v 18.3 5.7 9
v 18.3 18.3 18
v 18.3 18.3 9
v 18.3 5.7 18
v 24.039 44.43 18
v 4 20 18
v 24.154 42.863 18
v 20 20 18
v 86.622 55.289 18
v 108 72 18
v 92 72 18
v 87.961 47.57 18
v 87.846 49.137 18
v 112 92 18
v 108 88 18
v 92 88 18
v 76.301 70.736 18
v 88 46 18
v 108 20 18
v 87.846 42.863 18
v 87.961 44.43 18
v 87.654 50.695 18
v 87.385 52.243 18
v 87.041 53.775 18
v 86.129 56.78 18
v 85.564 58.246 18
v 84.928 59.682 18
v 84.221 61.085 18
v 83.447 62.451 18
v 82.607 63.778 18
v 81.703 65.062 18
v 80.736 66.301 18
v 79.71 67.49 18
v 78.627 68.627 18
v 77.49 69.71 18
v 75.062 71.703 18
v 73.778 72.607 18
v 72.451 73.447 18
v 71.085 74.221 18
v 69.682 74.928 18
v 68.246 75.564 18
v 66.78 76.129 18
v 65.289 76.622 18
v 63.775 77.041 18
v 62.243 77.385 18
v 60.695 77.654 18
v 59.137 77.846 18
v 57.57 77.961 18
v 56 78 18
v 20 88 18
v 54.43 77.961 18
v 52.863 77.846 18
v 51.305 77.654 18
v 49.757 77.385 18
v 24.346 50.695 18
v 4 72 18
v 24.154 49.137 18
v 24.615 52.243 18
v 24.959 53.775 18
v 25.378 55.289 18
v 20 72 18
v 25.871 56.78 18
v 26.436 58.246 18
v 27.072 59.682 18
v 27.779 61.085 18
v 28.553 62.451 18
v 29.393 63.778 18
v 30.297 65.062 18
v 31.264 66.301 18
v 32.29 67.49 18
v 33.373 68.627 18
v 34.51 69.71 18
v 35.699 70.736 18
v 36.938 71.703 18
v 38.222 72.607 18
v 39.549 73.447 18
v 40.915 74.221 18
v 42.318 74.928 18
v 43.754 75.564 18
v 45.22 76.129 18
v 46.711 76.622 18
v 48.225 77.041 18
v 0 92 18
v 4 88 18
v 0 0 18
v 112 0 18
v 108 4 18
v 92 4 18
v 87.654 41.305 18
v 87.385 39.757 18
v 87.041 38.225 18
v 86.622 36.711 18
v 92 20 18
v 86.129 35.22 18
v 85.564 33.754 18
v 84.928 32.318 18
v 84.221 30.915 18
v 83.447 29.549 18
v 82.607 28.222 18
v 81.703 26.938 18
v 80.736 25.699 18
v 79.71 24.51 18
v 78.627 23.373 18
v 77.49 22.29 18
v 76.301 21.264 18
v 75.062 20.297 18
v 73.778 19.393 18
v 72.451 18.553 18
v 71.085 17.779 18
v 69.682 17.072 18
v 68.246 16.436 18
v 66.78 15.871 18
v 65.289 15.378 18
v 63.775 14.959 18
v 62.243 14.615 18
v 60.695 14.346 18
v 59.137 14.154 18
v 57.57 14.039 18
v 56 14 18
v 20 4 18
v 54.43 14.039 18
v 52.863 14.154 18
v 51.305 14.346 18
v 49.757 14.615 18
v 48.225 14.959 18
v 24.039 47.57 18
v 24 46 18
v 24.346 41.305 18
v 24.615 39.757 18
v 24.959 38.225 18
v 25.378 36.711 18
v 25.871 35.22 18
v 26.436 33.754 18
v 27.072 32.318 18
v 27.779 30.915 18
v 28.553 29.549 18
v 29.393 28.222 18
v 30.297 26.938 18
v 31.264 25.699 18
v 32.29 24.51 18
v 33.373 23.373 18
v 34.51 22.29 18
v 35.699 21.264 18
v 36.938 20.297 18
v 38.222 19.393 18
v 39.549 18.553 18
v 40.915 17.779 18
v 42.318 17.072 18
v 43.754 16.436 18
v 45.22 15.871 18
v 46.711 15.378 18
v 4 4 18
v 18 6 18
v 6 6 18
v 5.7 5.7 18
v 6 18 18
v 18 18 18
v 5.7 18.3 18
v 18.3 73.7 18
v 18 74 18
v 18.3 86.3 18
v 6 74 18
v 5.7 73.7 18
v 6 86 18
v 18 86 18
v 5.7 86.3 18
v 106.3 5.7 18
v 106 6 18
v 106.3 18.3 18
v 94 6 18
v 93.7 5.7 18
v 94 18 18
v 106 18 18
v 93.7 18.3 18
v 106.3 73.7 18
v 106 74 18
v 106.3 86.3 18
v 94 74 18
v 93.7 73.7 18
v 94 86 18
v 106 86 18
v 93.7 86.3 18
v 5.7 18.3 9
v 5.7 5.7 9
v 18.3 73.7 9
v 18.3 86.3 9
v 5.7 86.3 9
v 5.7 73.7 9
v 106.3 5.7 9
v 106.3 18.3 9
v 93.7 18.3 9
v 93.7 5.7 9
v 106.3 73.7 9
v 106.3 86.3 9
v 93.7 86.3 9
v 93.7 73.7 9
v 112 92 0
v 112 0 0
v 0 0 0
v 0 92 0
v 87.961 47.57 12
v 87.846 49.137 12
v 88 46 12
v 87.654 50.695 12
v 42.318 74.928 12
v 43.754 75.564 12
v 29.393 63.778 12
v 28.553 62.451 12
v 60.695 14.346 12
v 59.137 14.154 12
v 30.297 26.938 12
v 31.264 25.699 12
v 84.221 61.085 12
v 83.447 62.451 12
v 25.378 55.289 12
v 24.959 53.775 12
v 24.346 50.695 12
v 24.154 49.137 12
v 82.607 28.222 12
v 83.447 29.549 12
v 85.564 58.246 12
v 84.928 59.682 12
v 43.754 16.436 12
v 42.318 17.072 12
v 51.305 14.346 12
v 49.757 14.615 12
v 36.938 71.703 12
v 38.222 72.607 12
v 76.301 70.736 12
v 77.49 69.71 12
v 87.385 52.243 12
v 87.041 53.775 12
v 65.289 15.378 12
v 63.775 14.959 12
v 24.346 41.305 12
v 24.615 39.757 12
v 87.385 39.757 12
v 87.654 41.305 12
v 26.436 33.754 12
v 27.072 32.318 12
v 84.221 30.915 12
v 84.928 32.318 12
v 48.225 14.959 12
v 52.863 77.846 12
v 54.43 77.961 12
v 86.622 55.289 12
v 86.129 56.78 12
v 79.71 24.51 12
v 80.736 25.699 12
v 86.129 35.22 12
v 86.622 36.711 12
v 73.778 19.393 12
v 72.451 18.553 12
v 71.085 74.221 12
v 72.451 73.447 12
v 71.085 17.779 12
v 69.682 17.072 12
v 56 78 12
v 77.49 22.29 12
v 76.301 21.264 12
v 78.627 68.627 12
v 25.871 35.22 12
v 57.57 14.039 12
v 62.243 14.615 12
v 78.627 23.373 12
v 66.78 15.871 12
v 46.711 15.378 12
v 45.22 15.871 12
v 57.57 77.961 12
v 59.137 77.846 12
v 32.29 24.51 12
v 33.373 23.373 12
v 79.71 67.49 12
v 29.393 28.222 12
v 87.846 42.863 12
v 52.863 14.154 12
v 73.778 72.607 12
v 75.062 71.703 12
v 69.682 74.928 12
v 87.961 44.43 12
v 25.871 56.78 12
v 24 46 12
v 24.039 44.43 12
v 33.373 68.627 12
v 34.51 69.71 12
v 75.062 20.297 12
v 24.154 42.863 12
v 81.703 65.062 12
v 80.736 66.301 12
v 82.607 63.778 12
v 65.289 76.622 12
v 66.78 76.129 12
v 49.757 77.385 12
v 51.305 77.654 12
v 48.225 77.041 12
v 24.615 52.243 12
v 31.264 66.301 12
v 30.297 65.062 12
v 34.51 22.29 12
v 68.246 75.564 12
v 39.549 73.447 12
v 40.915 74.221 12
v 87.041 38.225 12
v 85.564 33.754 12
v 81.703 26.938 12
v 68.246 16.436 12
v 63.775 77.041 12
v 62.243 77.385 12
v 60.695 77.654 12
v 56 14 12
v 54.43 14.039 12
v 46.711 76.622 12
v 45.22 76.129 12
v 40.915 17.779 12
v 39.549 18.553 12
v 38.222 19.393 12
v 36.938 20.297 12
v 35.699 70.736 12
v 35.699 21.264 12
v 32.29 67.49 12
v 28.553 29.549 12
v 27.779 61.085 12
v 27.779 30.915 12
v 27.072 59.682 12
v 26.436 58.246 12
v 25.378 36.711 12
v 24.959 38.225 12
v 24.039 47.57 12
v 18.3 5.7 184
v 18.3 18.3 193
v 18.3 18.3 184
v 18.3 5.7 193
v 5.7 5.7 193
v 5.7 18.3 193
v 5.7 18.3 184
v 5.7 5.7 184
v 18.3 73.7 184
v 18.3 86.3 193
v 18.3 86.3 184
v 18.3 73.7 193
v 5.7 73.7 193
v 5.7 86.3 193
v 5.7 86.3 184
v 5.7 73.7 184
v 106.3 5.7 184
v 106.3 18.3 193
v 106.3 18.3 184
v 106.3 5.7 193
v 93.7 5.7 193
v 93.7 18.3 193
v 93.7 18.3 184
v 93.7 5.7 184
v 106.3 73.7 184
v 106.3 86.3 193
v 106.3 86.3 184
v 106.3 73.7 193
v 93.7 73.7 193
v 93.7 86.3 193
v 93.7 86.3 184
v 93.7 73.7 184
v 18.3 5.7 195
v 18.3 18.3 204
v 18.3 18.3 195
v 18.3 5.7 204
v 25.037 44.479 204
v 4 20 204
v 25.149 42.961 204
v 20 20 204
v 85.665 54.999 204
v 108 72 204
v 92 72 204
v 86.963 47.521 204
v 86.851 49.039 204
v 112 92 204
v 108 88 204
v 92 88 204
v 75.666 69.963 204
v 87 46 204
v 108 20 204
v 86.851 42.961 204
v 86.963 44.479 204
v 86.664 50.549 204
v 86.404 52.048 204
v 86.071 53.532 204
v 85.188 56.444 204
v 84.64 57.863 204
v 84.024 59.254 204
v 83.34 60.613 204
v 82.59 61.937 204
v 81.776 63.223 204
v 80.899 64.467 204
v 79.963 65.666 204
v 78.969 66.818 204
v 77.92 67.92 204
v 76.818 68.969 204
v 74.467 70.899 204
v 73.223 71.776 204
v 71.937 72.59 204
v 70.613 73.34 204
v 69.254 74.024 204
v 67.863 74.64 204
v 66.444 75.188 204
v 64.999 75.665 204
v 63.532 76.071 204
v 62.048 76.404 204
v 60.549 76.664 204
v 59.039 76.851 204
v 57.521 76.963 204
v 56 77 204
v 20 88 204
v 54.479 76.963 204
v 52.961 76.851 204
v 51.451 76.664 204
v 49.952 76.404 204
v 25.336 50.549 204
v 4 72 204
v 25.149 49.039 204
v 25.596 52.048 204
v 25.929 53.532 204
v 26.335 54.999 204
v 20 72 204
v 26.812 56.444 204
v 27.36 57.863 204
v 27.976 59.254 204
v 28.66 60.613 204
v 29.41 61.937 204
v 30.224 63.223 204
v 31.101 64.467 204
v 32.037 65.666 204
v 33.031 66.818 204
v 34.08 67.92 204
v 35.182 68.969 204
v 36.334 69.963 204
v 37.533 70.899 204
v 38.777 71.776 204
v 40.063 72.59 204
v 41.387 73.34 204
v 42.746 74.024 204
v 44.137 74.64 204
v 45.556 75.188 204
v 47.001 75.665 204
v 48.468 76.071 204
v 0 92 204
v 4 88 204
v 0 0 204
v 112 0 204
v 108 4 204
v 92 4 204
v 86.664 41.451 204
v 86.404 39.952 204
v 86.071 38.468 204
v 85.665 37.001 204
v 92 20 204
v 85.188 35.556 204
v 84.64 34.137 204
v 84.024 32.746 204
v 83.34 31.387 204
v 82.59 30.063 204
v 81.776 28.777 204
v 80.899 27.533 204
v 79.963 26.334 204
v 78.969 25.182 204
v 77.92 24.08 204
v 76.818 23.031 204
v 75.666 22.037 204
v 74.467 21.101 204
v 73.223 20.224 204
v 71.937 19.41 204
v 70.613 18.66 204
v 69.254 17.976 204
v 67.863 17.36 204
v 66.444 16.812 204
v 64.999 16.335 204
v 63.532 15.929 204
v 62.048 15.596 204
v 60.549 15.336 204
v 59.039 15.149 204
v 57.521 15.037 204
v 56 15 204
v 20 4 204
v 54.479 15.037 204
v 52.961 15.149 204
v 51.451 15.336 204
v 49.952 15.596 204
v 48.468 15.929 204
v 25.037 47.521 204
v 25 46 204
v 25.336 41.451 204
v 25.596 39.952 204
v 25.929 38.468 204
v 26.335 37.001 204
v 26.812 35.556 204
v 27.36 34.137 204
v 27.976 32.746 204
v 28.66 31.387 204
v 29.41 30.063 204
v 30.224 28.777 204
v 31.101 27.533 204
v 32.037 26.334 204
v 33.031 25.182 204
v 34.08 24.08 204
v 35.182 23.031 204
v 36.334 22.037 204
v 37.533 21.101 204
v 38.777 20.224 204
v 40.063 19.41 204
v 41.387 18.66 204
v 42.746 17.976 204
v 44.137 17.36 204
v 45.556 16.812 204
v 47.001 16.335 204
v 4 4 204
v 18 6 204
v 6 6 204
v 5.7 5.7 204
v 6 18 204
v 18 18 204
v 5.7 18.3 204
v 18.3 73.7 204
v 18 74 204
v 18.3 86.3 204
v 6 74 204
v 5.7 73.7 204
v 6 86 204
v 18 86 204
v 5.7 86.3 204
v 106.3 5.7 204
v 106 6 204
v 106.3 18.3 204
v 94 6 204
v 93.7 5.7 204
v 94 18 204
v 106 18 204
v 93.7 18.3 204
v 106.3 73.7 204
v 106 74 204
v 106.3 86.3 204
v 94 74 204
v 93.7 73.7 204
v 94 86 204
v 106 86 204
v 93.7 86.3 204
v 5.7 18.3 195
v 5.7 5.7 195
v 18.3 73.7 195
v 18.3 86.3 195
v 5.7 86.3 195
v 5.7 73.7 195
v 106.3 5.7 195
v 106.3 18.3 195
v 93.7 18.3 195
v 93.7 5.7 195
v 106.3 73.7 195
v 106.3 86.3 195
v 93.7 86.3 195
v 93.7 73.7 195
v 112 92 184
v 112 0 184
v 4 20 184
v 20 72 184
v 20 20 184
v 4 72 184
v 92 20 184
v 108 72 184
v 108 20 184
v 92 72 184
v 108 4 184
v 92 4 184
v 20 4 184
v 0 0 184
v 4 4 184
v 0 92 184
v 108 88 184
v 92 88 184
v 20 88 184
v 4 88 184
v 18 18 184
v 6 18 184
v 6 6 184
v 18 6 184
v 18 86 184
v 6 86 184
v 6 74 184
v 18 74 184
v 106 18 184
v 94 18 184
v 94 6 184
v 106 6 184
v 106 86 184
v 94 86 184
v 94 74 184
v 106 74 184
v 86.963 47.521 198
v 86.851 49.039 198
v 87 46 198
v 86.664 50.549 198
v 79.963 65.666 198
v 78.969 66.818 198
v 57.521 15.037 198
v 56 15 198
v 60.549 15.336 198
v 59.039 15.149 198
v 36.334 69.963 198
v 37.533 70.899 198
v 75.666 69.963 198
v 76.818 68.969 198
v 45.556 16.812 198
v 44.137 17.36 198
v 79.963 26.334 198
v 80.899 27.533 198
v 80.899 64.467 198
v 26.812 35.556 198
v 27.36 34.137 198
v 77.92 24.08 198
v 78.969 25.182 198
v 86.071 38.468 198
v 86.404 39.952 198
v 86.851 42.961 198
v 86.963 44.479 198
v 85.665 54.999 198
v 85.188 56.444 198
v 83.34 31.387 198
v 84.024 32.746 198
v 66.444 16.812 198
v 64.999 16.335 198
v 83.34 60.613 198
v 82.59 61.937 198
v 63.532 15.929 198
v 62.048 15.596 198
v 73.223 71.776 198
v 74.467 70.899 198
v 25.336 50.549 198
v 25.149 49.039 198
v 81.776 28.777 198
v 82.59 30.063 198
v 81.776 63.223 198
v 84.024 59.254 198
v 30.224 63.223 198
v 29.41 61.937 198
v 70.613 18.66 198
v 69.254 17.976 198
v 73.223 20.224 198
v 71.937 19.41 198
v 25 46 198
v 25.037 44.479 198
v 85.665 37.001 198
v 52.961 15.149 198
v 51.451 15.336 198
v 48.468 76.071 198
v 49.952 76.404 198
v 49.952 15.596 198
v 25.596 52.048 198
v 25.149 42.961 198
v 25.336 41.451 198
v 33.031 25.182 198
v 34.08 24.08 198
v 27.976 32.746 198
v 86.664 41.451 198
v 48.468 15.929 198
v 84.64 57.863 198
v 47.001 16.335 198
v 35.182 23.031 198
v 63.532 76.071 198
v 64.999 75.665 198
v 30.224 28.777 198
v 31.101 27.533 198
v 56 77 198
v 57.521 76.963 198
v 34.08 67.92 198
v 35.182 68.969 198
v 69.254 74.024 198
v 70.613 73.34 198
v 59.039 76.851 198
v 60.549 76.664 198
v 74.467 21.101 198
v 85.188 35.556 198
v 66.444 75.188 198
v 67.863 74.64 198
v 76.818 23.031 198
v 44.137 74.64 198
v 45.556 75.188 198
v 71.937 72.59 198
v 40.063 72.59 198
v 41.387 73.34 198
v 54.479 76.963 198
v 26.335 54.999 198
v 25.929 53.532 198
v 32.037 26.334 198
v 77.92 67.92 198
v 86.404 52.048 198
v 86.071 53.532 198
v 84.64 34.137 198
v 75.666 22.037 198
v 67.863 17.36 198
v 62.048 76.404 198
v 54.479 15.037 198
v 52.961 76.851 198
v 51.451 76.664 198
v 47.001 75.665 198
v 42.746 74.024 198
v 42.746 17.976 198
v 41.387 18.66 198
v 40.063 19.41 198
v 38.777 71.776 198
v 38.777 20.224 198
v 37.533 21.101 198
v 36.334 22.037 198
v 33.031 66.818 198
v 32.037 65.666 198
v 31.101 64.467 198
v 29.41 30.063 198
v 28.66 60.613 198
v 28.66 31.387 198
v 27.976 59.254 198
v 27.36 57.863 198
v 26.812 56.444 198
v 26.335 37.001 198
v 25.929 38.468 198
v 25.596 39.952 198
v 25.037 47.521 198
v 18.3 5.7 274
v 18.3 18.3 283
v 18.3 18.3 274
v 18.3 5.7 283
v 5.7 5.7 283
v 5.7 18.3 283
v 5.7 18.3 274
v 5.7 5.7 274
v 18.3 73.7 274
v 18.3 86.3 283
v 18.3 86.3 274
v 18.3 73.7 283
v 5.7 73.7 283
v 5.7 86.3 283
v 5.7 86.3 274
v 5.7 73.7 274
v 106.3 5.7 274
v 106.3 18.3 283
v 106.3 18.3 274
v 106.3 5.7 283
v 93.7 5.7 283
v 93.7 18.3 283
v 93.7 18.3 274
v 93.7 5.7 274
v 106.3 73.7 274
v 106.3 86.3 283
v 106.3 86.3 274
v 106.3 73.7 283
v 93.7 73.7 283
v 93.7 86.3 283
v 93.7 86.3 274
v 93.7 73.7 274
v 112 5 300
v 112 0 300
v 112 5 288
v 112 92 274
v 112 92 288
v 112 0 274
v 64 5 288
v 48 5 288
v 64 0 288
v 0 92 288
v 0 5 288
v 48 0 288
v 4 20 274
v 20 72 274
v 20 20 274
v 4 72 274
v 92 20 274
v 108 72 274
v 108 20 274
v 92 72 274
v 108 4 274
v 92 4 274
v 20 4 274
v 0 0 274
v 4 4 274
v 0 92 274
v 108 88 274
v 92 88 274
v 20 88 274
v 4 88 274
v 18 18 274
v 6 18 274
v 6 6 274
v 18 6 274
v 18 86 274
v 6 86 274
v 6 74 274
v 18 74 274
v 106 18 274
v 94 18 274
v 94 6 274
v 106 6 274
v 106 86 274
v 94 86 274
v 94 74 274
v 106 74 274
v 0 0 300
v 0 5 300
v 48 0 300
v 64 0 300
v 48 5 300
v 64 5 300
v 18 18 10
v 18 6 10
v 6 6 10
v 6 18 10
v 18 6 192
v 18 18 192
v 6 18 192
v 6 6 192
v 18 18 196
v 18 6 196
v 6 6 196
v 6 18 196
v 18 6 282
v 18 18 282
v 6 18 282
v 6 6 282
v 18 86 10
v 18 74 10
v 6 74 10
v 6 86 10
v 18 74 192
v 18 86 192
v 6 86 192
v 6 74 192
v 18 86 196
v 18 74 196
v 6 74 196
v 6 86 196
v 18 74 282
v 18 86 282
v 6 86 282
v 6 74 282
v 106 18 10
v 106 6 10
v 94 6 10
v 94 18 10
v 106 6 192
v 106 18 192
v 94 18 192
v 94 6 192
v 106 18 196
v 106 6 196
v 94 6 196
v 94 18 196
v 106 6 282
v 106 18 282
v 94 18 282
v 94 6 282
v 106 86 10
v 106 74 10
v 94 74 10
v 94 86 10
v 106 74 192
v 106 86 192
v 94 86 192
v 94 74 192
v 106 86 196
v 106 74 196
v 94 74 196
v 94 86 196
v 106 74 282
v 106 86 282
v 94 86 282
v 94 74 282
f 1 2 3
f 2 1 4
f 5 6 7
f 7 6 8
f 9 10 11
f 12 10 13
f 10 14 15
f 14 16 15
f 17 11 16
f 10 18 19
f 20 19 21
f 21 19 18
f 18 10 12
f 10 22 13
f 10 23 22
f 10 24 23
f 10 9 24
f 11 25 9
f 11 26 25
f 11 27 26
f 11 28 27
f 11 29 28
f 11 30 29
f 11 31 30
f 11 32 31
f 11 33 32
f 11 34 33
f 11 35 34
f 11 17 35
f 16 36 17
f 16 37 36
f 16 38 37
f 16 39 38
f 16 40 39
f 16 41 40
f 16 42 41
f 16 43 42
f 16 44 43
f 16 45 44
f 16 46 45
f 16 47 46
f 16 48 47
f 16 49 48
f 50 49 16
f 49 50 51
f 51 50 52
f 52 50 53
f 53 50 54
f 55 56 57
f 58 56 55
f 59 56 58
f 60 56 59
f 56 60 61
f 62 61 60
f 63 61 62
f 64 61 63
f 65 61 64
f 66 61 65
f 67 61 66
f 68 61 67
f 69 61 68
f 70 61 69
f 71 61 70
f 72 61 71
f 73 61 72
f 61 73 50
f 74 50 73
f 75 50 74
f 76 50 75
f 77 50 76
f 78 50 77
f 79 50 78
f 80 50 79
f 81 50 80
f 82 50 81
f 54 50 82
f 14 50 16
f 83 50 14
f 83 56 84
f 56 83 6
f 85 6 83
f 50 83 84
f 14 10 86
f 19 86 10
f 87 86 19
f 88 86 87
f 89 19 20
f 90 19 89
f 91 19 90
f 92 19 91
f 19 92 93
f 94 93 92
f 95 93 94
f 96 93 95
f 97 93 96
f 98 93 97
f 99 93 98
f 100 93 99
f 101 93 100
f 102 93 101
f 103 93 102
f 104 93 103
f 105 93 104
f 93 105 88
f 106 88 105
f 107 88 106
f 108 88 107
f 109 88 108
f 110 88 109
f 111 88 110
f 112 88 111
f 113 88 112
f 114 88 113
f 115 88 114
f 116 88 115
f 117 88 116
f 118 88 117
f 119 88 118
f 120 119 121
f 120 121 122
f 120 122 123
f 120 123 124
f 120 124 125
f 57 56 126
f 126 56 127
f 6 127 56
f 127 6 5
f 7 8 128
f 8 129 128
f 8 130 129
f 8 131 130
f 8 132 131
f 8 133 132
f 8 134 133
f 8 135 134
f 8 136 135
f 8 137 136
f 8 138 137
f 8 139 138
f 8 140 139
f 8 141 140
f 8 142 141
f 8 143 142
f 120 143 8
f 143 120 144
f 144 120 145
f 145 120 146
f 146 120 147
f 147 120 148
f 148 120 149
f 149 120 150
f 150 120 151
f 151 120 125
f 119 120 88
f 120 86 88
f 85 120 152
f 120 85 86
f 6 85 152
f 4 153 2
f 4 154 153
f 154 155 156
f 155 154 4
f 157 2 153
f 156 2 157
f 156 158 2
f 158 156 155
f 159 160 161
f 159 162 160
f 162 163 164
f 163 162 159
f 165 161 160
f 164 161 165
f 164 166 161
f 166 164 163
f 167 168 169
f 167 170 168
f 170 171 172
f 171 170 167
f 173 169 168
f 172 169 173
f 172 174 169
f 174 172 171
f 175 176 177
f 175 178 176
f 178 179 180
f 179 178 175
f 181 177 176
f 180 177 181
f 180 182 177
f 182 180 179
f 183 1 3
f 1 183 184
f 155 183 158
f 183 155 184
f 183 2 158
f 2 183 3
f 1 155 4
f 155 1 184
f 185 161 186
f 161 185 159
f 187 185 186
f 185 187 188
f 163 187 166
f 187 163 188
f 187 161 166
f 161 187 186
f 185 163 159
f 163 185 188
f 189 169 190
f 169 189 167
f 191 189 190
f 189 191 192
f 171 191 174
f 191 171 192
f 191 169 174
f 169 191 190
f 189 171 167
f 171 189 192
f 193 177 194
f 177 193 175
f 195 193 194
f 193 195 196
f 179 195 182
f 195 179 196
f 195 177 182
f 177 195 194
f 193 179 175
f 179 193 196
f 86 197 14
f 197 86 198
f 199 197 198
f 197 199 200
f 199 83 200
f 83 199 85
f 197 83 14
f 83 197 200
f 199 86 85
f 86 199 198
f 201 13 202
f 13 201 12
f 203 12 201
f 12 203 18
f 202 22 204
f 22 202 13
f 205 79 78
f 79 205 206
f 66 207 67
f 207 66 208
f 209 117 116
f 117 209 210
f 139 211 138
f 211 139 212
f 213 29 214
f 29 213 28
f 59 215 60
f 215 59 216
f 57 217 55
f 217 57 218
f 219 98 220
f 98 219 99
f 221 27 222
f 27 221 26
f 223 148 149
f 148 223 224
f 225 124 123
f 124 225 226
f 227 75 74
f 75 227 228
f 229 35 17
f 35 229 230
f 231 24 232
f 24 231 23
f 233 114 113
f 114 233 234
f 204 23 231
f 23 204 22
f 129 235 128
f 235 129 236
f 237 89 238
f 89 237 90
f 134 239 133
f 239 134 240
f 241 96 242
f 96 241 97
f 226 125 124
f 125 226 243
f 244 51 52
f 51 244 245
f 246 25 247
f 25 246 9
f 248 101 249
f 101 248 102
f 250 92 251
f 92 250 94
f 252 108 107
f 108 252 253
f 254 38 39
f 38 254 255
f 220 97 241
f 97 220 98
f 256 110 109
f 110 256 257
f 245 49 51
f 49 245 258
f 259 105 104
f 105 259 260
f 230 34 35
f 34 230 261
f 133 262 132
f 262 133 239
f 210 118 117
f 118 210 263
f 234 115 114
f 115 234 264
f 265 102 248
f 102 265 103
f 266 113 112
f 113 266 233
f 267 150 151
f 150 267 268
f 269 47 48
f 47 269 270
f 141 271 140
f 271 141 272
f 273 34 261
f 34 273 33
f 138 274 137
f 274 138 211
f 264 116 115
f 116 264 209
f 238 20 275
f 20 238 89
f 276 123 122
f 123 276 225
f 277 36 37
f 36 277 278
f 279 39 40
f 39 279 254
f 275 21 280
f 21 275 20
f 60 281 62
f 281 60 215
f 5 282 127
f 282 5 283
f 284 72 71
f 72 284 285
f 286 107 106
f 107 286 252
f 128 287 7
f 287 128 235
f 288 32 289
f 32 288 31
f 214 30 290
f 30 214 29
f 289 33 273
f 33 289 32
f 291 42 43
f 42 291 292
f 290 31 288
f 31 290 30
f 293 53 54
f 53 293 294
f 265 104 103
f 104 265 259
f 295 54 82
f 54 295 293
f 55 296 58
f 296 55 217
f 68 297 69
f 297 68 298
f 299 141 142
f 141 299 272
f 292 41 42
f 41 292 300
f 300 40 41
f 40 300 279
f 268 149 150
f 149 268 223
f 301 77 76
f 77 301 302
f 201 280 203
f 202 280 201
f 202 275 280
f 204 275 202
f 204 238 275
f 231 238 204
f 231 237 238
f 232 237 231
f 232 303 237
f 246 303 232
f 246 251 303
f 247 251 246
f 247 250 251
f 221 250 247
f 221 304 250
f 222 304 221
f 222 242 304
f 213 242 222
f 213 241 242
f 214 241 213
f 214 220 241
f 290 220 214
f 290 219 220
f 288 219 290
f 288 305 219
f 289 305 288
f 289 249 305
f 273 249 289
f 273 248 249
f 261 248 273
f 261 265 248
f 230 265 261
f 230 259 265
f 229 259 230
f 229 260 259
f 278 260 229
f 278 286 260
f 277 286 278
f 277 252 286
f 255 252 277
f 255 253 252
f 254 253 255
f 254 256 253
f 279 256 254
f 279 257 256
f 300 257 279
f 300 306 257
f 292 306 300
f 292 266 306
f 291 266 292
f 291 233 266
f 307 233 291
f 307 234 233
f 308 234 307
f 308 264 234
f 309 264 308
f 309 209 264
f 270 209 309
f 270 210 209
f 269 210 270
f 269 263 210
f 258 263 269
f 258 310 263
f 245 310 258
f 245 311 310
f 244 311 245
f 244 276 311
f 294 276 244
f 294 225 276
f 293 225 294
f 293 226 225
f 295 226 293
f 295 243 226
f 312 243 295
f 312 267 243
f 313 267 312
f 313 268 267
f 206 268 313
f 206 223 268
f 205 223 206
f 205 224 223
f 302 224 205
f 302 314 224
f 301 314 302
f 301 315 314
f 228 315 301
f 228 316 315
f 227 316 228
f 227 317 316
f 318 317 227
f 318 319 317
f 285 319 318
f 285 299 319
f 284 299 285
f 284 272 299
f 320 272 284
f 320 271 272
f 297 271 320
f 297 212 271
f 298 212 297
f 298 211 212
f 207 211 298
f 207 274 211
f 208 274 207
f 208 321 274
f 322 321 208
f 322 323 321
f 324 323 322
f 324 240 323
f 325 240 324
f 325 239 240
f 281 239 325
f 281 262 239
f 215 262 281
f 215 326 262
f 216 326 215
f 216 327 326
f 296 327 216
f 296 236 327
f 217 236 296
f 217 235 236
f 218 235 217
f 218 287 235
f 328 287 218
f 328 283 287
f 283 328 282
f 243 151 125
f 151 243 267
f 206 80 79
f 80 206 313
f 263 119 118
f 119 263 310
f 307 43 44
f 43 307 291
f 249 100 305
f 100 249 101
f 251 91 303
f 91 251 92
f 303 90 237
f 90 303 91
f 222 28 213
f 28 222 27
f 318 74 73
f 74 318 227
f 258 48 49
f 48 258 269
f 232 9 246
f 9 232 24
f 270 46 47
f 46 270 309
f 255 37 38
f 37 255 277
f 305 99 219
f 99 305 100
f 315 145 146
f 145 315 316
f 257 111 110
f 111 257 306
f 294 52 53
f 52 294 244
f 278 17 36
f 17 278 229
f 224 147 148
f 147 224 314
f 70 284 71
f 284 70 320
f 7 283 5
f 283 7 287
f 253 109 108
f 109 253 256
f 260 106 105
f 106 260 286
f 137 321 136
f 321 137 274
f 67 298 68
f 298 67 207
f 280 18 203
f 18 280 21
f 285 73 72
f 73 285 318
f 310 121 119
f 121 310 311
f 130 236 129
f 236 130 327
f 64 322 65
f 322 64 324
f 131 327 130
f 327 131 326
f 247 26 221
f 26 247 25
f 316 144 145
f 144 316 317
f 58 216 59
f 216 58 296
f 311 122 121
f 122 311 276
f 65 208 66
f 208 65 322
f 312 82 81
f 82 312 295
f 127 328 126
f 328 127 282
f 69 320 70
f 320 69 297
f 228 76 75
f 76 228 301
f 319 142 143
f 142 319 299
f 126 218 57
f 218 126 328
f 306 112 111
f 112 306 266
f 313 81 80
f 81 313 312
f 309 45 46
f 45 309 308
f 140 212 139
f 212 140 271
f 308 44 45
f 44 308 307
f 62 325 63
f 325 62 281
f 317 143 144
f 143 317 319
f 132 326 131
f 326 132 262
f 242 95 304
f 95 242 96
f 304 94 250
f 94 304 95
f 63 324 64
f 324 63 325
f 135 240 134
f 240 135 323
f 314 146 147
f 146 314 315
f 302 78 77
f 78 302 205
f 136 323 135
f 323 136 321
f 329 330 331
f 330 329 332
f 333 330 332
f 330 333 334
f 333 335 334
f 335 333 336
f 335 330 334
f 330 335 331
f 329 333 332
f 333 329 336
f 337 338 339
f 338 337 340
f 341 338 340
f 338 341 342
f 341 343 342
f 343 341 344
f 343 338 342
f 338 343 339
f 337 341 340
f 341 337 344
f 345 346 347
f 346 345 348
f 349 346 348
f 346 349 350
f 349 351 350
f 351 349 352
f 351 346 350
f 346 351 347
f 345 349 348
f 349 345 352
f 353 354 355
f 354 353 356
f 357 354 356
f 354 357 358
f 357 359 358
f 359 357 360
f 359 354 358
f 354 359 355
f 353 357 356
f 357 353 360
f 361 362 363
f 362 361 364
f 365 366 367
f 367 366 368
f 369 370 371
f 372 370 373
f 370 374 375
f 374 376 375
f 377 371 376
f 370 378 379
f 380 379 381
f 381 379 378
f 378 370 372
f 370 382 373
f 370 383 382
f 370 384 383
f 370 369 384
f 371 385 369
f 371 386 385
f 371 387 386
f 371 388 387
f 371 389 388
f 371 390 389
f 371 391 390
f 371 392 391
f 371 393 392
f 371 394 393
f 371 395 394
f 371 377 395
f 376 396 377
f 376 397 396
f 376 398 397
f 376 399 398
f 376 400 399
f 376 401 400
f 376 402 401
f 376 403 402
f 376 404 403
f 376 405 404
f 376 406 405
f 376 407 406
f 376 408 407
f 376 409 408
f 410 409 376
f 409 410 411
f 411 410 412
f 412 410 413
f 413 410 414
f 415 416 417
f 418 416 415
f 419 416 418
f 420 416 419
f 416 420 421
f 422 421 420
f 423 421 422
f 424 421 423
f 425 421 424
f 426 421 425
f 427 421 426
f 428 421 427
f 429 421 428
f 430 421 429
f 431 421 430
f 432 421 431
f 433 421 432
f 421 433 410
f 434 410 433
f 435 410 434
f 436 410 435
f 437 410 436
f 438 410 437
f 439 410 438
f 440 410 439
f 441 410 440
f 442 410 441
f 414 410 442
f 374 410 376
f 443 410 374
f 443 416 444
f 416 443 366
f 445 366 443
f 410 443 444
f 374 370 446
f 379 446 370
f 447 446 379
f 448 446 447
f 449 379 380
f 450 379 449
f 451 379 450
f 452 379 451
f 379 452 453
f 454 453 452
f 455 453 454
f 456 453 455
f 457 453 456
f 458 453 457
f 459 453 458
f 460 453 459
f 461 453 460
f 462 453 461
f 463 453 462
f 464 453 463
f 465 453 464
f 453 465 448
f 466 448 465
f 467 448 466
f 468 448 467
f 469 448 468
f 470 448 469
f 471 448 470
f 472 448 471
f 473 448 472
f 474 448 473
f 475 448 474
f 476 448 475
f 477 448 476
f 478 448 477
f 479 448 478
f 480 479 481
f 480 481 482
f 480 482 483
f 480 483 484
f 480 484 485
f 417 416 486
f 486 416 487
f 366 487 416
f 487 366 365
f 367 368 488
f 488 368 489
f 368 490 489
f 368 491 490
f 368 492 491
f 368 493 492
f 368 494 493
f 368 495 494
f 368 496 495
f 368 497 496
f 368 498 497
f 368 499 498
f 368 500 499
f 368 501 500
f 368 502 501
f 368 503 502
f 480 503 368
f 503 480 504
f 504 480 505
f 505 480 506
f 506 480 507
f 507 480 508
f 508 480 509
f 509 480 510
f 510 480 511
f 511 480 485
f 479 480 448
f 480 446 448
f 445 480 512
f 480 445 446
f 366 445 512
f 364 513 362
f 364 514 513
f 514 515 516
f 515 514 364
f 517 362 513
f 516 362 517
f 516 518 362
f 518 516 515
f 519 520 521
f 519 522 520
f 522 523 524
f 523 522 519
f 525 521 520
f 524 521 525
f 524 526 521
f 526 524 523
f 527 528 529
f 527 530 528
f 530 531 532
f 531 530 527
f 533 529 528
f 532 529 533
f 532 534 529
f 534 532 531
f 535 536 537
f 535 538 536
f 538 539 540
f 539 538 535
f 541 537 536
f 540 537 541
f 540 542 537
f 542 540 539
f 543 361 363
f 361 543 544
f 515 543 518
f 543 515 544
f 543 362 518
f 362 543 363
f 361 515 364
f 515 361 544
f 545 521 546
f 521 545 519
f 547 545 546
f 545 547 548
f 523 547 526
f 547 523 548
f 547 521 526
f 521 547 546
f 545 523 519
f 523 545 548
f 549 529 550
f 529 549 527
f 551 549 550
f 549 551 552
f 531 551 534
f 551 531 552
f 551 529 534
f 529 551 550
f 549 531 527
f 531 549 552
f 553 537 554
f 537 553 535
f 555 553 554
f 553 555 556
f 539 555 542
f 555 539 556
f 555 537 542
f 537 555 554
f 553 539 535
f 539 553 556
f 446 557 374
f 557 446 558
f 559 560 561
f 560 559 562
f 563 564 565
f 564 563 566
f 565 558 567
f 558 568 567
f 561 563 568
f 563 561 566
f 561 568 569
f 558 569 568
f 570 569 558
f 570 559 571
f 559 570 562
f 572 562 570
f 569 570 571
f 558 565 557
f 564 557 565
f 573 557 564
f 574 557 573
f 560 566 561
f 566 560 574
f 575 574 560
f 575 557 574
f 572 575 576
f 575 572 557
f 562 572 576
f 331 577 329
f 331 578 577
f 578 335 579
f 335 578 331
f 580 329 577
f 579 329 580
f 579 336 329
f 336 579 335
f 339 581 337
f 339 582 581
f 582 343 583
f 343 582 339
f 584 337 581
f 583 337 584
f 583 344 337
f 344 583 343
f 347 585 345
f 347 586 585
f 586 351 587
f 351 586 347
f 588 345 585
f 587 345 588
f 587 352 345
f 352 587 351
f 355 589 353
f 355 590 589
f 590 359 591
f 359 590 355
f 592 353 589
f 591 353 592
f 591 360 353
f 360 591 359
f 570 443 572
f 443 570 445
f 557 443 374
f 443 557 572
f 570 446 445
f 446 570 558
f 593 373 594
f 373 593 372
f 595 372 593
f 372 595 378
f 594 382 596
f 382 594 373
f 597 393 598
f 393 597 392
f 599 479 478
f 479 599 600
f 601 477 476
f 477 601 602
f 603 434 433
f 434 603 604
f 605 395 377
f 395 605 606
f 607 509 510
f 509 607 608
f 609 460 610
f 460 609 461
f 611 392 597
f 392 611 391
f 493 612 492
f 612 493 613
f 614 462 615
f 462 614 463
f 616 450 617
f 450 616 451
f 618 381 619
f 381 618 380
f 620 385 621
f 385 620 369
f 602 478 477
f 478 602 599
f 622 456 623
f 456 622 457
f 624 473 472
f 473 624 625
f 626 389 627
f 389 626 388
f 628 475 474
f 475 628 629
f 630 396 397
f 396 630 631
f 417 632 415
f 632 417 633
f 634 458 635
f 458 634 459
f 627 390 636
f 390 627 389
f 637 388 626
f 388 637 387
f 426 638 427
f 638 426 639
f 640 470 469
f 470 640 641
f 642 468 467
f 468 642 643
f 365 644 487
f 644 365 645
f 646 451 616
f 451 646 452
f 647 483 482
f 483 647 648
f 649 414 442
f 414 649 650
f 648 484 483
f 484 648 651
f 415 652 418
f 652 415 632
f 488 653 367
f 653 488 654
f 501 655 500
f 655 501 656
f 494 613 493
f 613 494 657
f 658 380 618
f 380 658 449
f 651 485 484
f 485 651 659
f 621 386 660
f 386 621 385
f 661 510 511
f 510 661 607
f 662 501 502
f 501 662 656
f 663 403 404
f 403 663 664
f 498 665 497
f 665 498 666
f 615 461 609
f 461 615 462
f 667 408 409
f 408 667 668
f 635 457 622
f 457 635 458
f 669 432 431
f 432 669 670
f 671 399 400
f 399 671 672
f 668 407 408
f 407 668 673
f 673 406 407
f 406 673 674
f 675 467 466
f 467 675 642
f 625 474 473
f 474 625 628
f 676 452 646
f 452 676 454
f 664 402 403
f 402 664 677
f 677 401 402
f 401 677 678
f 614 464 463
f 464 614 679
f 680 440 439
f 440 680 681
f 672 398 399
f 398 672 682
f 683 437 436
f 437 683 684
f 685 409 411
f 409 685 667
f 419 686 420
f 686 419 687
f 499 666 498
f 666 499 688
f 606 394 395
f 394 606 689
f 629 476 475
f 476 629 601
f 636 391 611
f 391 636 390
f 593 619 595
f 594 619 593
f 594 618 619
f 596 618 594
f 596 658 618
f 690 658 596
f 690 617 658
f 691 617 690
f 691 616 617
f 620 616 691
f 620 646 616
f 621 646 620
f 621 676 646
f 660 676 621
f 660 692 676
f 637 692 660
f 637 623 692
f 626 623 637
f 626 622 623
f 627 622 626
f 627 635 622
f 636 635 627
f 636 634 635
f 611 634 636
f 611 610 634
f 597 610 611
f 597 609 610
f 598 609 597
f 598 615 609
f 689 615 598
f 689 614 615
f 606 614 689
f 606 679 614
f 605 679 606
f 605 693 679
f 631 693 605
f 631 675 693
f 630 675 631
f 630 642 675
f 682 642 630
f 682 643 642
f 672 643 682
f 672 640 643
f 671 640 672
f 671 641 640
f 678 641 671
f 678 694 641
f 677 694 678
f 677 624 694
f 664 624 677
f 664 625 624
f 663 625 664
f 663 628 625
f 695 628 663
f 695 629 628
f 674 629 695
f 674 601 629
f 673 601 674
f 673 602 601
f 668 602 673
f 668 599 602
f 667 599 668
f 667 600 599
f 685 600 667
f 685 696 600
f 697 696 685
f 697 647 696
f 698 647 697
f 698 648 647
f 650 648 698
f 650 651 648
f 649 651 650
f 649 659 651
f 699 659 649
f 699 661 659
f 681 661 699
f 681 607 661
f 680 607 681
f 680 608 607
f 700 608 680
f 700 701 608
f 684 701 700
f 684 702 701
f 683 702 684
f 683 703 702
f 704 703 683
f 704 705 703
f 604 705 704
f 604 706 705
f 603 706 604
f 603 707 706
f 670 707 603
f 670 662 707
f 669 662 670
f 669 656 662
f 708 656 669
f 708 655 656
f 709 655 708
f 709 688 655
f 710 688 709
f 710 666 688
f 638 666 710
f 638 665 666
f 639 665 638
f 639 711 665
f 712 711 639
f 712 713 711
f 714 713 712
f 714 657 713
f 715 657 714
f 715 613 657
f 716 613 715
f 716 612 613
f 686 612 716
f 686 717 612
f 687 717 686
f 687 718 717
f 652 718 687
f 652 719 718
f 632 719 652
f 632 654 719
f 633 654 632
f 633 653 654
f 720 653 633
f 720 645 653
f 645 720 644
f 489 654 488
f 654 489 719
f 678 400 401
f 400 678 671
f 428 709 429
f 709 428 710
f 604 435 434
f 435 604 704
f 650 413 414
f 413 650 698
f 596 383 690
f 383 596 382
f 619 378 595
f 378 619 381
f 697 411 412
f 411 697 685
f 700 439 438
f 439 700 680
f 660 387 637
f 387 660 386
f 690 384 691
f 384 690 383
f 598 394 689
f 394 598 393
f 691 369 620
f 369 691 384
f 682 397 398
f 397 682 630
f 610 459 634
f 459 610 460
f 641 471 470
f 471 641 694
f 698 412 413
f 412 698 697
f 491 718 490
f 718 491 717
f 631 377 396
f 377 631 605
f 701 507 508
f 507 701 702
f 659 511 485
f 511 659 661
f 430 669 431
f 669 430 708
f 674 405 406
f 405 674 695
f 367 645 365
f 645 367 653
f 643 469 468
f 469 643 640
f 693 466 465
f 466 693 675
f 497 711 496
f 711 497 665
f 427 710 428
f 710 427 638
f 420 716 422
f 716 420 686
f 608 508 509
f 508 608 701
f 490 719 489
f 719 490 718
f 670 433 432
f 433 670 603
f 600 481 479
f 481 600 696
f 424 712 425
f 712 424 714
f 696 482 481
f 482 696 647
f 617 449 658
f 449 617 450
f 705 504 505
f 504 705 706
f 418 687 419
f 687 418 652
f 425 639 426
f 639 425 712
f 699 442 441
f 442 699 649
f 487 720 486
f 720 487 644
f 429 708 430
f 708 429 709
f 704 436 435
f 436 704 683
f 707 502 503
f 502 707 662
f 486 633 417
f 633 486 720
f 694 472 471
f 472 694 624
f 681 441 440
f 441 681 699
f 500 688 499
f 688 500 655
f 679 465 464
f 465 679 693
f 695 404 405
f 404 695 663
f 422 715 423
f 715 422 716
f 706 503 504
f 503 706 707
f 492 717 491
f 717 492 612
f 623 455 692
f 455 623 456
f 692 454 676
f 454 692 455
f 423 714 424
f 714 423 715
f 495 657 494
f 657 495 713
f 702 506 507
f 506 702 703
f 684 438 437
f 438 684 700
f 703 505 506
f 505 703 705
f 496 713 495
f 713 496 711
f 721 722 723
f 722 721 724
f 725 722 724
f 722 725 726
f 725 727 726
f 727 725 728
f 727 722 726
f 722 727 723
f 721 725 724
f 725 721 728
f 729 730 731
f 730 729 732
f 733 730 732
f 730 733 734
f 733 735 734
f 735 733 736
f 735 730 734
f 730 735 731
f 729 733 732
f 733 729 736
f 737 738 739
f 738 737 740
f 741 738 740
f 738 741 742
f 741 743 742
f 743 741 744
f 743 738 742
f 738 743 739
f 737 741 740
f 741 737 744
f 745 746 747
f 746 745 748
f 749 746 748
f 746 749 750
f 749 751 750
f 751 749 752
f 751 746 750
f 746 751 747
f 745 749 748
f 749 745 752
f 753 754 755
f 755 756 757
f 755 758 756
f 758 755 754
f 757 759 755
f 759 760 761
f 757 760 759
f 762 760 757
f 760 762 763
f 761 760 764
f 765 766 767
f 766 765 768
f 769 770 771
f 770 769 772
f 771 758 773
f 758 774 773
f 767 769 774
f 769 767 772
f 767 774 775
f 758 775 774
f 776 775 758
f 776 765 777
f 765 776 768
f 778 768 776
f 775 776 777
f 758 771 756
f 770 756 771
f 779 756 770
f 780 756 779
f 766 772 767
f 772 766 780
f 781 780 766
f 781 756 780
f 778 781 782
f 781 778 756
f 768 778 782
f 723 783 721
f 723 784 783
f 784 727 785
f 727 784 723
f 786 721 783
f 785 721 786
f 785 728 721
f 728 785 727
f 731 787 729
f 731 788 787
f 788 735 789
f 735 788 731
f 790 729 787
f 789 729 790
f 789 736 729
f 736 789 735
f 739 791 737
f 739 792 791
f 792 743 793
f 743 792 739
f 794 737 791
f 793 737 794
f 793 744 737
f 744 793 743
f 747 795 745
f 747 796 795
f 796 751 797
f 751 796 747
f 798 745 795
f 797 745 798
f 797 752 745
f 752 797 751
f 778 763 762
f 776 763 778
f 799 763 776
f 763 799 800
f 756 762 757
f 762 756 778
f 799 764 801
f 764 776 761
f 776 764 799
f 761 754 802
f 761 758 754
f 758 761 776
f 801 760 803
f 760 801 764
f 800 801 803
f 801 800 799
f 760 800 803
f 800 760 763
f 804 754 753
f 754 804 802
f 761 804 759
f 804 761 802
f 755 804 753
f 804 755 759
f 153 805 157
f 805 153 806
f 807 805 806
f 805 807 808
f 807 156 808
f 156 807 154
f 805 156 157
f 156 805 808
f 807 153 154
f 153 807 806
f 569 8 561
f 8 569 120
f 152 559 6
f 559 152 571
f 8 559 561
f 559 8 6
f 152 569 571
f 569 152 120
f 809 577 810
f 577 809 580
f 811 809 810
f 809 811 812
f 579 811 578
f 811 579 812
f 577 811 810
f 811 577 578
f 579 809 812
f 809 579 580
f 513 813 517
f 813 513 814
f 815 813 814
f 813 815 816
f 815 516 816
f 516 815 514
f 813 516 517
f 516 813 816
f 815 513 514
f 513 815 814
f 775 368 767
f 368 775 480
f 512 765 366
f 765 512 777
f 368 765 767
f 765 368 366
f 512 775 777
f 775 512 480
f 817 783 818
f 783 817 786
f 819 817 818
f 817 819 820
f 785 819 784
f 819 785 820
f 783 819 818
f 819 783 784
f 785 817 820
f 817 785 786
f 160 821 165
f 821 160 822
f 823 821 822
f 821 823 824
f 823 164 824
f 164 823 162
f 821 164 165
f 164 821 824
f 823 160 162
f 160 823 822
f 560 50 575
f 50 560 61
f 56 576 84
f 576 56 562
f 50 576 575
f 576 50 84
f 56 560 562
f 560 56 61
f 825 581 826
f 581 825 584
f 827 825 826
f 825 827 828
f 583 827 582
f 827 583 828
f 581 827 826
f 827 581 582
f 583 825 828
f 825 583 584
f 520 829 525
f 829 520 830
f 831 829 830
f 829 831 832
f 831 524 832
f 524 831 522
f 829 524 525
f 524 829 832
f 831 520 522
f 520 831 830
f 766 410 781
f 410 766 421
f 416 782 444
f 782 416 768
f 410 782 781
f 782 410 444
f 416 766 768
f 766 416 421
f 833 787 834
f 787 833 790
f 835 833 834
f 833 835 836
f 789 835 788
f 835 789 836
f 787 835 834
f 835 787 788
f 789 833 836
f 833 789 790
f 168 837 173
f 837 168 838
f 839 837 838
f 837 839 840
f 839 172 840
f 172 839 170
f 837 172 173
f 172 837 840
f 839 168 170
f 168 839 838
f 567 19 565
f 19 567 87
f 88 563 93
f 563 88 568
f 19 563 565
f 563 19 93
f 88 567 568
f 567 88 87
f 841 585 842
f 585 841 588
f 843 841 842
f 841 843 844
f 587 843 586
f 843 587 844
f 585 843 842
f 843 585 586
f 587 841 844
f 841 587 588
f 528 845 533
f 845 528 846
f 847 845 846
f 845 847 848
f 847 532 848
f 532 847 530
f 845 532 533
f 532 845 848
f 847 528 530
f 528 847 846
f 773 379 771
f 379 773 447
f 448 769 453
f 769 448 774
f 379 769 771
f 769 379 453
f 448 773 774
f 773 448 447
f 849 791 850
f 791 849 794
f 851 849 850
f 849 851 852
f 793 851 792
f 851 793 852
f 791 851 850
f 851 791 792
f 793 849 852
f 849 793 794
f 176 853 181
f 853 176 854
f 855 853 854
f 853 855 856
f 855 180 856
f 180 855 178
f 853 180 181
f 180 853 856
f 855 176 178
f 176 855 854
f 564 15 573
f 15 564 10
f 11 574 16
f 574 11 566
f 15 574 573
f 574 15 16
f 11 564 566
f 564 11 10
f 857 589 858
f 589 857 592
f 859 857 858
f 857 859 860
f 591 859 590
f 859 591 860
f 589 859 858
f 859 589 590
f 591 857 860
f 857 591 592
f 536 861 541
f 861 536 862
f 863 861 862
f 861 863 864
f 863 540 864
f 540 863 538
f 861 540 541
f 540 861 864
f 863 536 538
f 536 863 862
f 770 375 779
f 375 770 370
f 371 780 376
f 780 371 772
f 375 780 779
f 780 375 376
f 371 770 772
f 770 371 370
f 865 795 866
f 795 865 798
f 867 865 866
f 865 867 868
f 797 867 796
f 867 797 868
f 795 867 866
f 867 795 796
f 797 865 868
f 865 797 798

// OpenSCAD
// Comandante C40 stand — two-story tower (v2, four separate legs)
// 1F: body, 2F: grounds jar, roof: crank hook. Floors double as dust lids.
// Front slide-out: legs are at the corners, footprint widened so the body
// (Ø64) clears the front legs (inner gap 72mm).
// Units: mm. Origin: front-left-bottom corner of the footprint. Z up.
// part: "all" | "base" | "middle" | "roof" | "leg1" | "leg2"

part = "all";

// ---- parameters ----
W = 112;             // footprint width  (x) — widened for slide-out clearance
D = 92;              // footprint depth  (y)

body_bore = 64;
recess_d = 6;
body_c = [56, 46];
jar_bore = 62;
jar_c = [56, 46];

base_t = 18;         // 1F plate: z 0..18
f2_under = 184;      // 2F plate underside (body top 172 + slide lift 6 + margin 6)
mid_t = 20;          // 2F plate: z 184..204 (sockets 9 + web 2 + sockets 9)
roof_under = 274;    // roof underside (jar top 263 + slide lift 6 + margin 5)
roof_t = 14;         // roof plate: z 274..288
lip_h = 12;          // front lip above roof -> total height 300
lip_t = 5;
notch_w = 16;

leg = 16;            // leg cross-section (square)
inset = 4;           // leg inset from footprint edges
peg = 12;            // tenon peg cross-section
peg_l = 8;           // peg length (socket depth 9, 1mm end clearance)
socket = 12.6;       // socket (peg + 0.3 clearance per side)
socket_d = 9;

$fn = 128;

leg_x = [inset, W - inset - leg];
leg_y = [inset, D - inset - leg];

module socket_cut(z0, h = socket_d) {
    for (x = leg_x) for (y = leg_y)
        translate([x + (leg - socket) / 2, y + (leg - socket) / 2, z0])
            cube([socket, socket, h]);
}

module base() {
    difference() {
        cube([W, D, base_t]);
        translate([body_c[0], body_c[1], base_t - recess_d])
            cylinder(h = recess_d + 1, d = body_bore);
        socket_cut(base_t - socket_d);
    }
}

module middle() {
    difference() {
        translate([0, 0, f2_under]) cube([W, D, mid_t]);
        translate([jar_c[0], jar_c[1], f2_under + mid_t - recess_d])
            cylinder(h = recess_d + 1, d = jar_bore);
        socket_cut(f2_under - 1, socket_d + 1);   // bottom sockets (open downward)
        socket_cut(f2_under + mid_t - socket_d);  // top sockets
    }
}

module roof() {
    difference() {
        translate([0, 0, roof_under]) cube([W, D, roof_t]);
        socket_cut(roof_under - 1, socket_d + 1);
    }
    lip_z = roof_under + roof_t;
    translate([0, 0, lip_z]) cube([(W - notch_w) / 2, lip_t, lip_h]);
    translate([(W + notch_w) / 2, 0, lip_z]) cube([(W - notch_w) / 2, lip_t, lip_h]);
}

// one leg at the front-left corner, in assembled position
module leg1() {
    x = leg_x[0]; y = leg_y[0];
    translate([x + (leg - peg) / 2, y + (leg - peg) / 2, base_t - peg_l])
        cube([peg, peg, peg_l]);
    translate([x, y, base_t]) cube([leg, leg, f2_under - base_t]);
    translate([x + (leg - peg) / 2, y + (leg - peg) / 2, f2_under])
        cube([peg, peg, peg_l]);
}

module leg2() {
    x = leg_x[0]; y = leg_y[0];
    mid_top = f2_under + mid_t;
    translate([x + (leg - peg) / 2, y + (leg - peg) / 2, mid_top - peg_l])
        cube([peg, peg, peg_l]);
    translate([x, y, mid_top]) cube([leg, leg, roof_under - mid_top]);
    translate([x + (leg - peg) / 2, y + (leg - peg) / 2, roof_under])
        cube([peg, peg, peg_l]);
}

module all_legs() {
    for (x = leg_x) for (y = leg_y) {
        translate([x - leg_x[0], y - leg_y[0], 0]) { leg1(); leg2(); }
    }
}

if (part == "all") { base(); middle(); roof(); all_legs(); }
if (part == "base") base();
if (part == "middle") middle();
if (part == "roof") roof();
if (part == "leg1") leg1();
if (part == "leg2") leg2();
